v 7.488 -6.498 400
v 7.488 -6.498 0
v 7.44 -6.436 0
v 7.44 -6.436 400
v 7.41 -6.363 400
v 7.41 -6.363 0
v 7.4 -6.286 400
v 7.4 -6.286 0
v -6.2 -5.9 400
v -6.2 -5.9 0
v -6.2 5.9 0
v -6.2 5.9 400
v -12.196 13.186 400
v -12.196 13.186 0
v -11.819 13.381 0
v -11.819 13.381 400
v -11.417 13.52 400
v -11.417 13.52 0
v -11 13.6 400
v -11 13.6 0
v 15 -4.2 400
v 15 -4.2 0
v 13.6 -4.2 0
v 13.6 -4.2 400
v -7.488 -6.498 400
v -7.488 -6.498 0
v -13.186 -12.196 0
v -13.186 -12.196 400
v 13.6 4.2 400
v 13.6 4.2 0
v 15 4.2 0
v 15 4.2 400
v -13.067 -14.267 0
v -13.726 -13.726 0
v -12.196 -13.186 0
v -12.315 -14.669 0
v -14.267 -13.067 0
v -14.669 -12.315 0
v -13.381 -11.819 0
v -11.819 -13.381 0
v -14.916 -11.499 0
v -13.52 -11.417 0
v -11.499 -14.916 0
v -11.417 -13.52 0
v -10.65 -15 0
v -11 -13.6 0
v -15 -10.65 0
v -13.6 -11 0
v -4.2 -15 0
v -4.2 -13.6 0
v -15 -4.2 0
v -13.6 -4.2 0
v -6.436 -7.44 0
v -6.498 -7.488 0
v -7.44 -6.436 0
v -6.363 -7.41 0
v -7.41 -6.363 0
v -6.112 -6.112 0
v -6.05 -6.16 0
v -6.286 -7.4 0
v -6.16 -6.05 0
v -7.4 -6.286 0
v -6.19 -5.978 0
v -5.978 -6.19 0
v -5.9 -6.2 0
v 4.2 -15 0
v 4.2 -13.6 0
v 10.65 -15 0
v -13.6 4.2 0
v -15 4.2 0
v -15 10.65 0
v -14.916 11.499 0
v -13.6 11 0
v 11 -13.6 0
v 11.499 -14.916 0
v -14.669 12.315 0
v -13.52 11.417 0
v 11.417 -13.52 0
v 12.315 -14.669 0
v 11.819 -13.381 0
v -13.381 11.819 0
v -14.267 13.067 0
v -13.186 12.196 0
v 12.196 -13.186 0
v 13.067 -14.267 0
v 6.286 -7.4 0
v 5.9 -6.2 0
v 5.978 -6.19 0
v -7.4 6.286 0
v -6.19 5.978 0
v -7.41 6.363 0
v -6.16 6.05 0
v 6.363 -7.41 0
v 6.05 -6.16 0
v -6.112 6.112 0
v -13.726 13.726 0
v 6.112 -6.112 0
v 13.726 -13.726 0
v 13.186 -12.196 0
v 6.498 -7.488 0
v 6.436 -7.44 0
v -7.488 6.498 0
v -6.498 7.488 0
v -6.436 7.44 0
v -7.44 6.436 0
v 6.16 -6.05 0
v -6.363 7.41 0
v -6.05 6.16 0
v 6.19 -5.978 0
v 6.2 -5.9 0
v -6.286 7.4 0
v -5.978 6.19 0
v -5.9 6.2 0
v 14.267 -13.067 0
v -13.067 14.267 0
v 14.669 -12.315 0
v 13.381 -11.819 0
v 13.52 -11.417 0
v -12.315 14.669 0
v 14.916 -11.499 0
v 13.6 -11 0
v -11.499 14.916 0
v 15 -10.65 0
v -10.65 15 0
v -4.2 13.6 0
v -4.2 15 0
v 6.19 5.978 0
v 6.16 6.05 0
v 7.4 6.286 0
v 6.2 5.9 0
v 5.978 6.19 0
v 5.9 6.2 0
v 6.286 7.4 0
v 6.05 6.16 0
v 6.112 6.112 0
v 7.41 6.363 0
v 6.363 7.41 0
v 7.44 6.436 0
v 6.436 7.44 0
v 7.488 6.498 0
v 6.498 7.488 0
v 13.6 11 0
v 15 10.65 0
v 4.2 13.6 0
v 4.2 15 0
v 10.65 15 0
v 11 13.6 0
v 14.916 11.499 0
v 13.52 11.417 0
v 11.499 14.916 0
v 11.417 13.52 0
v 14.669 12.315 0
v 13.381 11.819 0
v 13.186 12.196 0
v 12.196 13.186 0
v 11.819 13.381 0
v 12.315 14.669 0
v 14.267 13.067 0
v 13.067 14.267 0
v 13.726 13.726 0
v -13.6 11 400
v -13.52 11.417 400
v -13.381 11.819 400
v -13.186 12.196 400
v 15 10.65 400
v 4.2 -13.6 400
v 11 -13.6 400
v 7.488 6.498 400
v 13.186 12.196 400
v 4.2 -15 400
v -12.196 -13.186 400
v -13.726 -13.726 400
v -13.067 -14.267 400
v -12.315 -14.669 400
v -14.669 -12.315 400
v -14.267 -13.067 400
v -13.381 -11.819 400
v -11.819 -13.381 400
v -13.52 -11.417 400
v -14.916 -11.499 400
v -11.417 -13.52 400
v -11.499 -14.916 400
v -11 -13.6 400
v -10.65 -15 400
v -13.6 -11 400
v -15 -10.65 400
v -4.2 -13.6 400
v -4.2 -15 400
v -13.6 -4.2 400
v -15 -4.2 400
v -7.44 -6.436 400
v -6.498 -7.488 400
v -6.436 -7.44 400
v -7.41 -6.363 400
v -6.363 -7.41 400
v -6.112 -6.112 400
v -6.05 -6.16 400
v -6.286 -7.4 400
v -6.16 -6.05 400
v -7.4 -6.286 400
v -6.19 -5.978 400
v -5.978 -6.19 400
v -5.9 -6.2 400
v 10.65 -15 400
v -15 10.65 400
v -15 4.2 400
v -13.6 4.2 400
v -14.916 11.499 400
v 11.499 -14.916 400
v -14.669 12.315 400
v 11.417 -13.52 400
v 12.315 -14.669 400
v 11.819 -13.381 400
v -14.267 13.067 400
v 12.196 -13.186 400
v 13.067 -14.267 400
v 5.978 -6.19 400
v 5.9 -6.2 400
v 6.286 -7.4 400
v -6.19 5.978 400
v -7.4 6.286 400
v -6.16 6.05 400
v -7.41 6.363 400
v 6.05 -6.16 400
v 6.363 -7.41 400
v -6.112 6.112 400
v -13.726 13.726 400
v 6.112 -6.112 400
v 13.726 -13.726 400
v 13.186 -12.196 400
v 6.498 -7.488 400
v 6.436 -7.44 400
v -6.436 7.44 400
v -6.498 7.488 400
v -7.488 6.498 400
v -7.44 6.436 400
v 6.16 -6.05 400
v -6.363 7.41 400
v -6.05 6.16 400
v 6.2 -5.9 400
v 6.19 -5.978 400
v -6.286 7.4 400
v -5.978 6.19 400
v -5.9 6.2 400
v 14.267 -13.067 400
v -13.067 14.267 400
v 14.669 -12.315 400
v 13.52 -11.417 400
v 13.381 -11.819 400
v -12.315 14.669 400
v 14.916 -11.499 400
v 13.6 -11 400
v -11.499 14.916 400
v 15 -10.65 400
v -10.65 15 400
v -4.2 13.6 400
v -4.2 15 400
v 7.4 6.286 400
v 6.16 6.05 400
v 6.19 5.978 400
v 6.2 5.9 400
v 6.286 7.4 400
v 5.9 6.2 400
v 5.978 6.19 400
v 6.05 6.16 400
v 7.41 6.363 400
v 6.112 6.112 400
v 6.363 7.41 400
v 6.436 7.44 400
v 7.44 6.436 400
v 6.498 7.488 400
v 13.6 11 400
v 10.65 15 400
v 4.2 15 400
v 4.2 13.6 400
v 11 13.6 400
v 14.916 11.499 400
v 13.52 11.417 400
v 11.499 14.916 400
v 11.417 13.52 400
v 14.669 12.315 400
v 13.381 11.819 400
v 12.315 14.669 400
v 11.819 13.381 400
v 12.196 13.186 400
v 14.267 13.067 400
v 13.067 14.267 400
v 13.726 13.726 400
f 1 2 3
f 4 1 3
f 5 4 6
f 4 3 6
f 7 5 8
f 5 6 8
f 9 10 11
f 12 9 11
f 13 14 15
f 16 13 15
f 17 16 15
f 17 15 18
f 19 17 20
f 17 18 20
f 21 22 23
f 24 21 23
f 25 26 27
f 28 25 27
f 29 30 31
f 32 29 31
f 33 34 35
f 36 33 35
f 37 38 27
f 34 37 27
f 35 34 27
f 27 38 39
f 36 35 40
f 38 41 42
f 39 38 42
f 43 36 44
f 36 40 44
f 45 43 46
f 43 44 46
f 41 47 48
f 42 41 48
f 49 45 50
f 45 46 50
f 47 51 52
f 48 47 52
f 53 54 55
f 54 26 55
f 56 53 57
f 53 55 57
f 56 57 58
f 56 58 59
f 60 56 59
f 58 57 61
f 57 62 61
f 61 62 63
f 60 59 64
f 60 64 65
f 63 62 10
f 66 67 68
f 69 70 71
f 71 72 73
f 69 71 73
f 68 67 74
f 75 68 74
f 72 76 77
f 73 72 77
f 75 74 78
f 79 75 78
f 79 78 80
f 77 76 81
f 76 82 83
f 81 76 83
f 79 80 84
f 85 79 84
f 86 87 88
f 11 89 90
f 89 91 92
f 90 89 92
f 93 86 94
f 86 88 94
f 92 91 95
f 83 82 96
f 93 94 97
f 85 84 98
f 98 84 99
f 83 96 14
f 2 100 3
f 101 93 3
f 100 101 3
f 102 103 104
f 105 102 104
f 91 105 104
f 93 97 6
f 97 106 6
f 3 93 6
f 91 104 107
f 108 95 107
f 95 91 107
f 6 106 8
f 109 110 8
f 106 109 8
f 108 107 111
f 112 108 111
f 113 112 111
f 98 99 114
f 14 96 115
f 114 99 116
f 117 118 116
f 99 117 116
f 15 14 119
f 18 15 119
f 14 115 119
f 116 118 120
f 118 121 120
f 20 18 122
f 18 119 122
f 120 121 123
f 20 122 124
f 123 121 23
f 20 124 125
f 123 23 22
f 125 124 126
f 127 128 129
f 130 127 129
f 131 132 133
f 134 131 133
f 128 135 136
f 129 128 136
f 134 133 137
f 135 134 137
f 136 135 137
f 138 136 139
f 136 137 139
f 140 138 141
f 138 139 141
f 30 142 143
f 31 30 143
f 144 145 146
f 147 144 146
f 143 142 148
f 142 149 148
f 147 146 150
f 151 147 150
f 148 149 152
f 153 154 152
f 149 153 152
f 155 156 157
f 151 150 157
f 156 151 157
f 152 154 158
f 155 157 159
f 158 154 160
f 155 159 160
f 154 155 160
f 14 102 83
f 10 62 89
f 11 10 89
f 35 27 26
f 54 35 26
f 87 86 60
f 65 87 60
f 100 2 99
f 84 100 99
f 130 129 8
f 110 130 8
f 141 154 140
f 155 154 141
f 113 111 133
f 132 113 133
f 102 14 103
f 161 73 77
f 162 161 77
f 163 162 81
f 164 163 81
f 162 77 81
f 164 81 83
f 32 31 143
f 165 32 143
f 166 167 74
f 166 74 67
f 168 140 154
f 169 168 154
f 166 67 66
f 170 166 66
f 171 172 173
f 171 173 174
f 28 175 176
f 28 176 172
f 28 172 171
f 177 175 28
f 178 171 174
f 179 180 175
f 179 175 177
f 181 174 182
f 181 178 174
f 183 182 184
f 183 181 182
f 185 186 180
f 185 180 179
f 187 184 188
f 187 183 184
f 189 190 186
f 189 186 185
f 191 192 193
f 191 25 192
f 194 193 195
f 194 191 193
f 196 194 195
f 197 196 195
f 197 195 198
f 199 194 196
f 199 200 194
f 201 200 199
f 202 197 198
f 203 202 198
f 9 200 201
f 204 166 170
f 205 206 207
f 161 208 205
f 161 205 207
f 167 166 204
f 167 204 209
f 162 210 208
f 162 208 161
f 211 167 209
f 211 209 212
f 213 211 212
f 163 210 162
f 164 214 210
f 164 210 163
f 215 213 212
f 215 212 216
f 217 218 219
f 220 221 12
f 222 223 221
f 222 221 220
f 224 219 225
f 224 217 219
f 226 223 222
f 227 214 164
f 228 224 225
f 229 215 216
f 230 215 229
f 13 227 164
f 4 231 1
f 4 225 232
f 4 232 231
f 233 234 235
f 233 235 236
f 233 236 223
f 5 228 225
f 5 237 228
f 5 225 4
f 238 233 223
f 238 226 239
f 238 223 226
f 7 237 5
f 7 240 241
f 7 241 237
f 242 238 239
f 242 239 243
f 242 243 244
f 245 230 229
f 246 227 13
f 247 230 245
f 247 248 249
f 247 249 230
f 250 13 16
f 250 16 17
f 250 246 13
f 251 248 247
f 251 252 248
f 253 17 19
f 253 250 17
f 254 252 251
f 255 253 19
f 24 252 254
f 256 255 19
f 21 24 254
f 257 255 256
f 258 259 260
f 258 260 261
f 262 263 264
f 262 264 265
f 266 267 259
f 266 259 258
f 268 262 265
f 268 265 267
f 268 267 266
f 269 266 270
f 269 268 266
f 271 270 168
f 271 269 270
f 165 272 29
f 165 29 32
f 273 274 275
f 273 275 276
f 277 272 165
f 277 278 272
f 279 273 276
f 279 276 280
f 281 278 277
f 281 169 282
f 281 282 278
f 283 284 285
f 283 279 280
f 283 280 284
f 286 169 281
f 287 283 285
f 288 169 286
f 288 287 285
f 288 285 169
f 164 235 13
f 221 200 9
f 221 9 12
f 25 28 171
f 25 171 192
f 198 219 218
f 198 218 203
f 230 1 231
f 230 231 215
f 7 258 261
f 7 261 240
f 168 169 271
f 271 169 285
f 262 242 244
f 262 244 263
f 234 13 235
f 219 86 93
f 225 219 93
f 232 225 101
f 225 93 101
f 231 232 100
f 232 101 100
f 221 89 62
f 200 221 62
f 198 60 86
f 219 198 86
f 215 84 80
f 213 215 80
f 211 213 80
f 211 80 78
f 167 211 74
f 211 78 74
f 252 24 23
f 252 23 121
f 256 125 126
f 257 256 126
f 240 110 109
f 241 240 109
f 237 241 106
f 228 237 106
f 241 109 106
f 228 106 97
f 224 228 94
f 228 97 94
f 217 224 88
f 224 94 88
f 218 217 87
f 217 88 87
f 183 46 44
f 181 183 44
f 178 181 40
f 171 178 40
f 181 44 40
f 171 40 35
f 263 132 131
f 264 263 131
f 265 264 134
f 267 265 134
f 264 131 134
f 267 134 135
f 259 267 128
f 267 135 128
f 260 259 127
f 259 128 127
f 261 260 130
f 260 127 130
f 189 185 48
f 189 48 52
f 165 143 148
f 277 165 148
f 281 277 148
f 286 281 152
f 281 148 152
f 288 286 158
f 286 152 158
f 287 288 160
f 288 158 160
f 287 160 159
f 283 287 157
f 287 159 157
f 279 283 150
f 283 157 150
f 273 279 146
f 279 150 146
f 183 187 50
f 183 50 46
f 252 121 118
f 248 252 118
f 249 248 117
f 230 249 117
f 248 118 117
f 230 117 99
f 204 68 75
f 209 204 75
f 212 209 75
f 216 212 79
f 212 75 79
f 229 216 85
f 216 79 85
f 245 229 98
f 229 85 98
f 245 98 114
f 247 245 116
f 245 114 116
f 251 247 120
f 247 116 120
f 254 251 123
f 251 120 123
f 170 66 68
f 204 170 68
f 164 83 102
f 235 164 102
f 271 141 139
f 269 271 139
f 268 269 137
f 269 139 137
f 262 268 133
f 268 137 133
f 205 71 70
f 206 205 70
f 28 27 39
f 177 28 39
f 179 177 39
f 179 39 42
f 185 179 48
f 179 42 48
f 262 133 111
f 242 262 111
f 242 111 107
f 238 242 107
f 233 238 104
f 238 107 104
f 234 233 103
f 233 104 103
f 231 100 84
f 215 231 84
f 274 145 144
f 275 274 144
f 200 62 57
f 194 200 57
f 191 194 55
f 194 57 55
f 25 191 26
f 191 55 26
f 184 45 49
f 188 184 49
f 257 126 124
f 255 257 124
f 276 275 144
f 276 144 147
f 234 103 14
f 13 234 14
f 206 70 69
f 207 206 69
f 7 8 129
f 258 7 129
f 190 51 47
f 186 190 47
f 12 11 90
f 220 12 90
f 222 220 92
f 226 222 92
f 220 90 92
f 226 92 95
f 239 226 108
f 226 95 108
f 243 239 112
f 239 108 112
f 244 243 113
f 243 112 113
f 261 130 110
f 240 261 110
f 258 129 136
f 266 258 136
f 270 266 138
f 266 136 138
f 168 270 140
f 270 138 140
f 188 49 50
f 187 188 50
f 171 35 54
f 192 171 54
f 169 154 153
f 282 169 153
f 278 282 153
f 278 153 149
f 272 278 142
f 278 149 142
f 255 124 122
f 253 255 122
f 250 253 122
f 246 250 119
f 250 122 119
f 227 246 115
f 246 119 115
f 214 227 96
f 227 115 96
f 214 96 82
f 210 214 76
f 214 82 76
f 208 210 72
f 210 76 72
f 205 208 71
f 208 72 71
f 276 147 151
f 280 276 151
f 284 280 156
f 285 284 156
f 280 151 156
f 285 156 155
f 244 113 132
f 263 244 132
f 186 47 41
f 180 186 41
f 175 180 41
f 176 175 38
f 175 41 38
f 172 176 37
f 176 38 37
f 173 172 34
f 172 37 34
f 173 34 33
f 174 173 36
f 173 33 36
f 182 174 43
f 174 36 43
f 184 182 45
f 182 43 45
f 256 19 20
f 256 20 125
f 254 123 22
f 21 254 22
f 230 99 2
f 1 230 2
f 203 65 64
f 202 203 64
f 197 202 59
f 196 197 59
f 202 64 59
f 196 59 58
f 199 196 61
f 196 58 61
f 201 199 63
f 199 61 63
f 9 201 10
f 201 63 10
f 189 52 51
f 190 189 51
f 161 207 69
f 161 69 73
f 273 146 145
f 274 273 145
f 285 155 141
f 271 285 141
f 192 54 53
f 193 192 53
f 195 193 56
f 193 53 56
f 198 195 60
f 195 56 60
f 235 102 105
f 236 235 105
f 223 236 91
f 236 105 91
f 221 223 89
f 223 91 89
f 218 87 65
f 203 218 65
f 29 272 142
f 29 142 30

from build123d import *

# Parameters (mm, degrees)
EXTRUDE_1_DEPTH = 400


with BuildPart() as part:
    # Эскиз1 → Бобышка-Вытянуть1 (new body)
    with BuildSketch(Plane.XY):
        with BuildLine():
            ThreePointArc((-10.65, 15), (-13.725914498, 13.725914498), (-15, 10.65))
            Line((-15, 10.65), (-15, 4.2))
            Line((-15, 4.2), (-13.6, 4.2))
            Line((-13.6, 4.2), (-13.6, 11))
            ThreePointArc((-13.6, 11), (-13.457683666, 11.620521732), (-13.186420313, 12.196470819))
            Line((-13.186420313, 12.196470819), (-7.487867966, 6.497918472))
            ThreePointArc((-7.487867966, 6.497918472), (-7.42283614, 6.400591467), (-7.4, 6.285786438))
            Line((-7.4, 6.285786438), (-7.4, 0))
            Line((-7.4, 0), (-7.4, -6.285786438))
            ThreePointArc((-7.4, -6.285786438), (-7.42283614, -6.400591467), (-7.487867966, -6.497918472))
            Line((-7.487867966, -6.497918472), (-13.186420313, -12.196470819))
            ThreePointArc((-13.186420313, -12.196470819), (-13.457683666, -11.620521732), (-13.6, -11))
            Line((-13.6, -11), (-13.6, -4.2))
            Line((-13.6, -4.2), (-15, -4.2))
            Line((-15, -4.2), (-15, -10.65))
            ThreePointArc((-15, -10.65), (-13.725914498, -13.725914498), (-10.65, -15))
            Line((-10.65, -15), (-4.2, -15))
            Line((-4.2, -15), (-4.2, -13.6))
            Line((-4.2, -13.6), (-11, -13.6))
            ThreePointArc((-11, -13.6), (-11.620521732, -13.457683666), (-12.196470819, -13.186420313))
            Line((-12.196470819, -13.186420313), (-6.497918472, -7.487867966))
            ThreePointArc((-6.497918472, -7.487867966), (-6.400591467, -7.42283614), (-6.285786438, -7.4))
            Line((-6.285786438, -7.4), (6.285786438, -7.4))
            ThreePointArc((6.285786438, -7.4), (6.400591467, -7.42283614), (6.497918472, -7.487867966))
            Line((6.497918472, -7.487867966), (12.196470819, -13.186420313))
            ThreePointArc((12.196470819, -13.186420313), (11.620521732, -13.457683666), (11, -13.6))
            Line((11, -13.6), (4.2, -13.6))
            Line((4.2, -13.6), (4.2, -15))
            Line((4.2, -15), (10.65, -15))
            ThreePointArc((10.65, -15), (13.725914498, -13.725914498), (15, -10.65))
            Line((15, -10.65), (15, -4.2))
            Line((15, -4.2), (13.6, -4.2))
            Line((13.6, -4.2), (13.6, -11))
            ThreePointArc((13.6, -11), (13.457683666, -11.620521732), (13.186420313, -12.196470819))
            Line((13.186420313, -12.196470819), (7.487867966, -6.497918472))
            ThreePointArc((7.487867966, -6.497918472), (7.42283614, -6.400591467), (7.4, -6.285786438))
            Line((7.4, -6.285786438), (7.4, 0))
            Line((7.4, 0), (7.4, 6.285786438))
            ThreePointArc((7.4, 6.285786438), (7.42283614, 6.400591467), (7.487867966, 6.497918472))
            Line((7.487867966, 6.497918472), (13.186420313, 12.196470819))
            ThreePointArc((13.186420313, 12.196470819), (13.457683666, 11.620521732), (13.6, 11))
            Line((13.6, 11), (13.6, 4.2))
            Line((13.6, 4.2), (15, 4.2))
            Line((15, 4.2), (15, 10.65))
            ThreePointArc((15, 10.65), (13.725914498, 13.725914498), (10.65, 15))
            Line((10.65, 15), (4.2, 15))
            Line((4.2, 15), (4.2, 13.6))
            Line((4.2, 13.6), (11, 13.6))
            ThreePointArc((11, 13.6), (11.620521732, 13.457683666), (12.196470819, 13.186420313))
            Line((12.196470819, 13.186420313), (6.497918472, 7.487867966))
            ThreePointArc((6.497918472, 7.487867966), (6.400591467, 7.42283614), (6.285786438, 7.4))
            Line((6.285786438, 7.4), (0, 7.4))
            Line((0, 7.4), (-6.285786438, 7.4))
            ThreePointArc((-6.285786438, 7.4), (-6.400591467, 7.42283614), (-6.497918472, 7.487867966))
            Line((-6.497918472, 7.487867966), (-12.196470819, 13.186420313))
            ThreePointArc((-12.196470819, 13.186420313), (-11.620521732, 13.457683666), (-11, 13.6))
            Line((-11, 13.6), (-4.2, 13.6))
            Line((-4.2, 13.6), (-4.2, 15))
            Line((-4.2, 15), (-10.65, 15))
        make_face()
        with BuildLine():
            Line((0.01702519, 6.2), (5.9, 6.2))
            ThreePointArc((5.9, 6.2), (6.112132034, 6.112132034), (6.2, 5.9))
            Line((6.2, 5.9), (6.2, -0.01702519))
            Line((6.2, -0.01702519), (6.2, -5.9))
            ThreePointArc((6.2, -5.9), (6.112132034, -6.112132034), (5.9, -6.2))
            Line((5.9, -6.2), (0.01702519, -6.2))
            Line((0.01702519, -6.2), (-0.01702519, -6.2))
            Line((-0.01702519, -6.2), (-5.9, -6.2))
            ThreePointArc((-5.9, -6.2), (-6.112132034, -6.112132034), (-6.2, -5.9))
            Line((-6.2, -5.9), (-6.2, -0.01702519))
            Line((-6.2, -0.01702519), (-6.2, 0))
            Line((-6.2, 0), (-6.2, 5.9))
            ThreePointArc((-6.2, 5.9), (-6.112132034, 6.112132034), (-5.9, 6.2))
            Line((-5.9, 6.2), (0, 6.2))
            Line((0, 6.2), (0.01702519, 6.2))
        make_face(mode=Mode.SUBTRACT)
    extrude(amount=EXTRUDE_1_DEPTH)


solid = part.part
